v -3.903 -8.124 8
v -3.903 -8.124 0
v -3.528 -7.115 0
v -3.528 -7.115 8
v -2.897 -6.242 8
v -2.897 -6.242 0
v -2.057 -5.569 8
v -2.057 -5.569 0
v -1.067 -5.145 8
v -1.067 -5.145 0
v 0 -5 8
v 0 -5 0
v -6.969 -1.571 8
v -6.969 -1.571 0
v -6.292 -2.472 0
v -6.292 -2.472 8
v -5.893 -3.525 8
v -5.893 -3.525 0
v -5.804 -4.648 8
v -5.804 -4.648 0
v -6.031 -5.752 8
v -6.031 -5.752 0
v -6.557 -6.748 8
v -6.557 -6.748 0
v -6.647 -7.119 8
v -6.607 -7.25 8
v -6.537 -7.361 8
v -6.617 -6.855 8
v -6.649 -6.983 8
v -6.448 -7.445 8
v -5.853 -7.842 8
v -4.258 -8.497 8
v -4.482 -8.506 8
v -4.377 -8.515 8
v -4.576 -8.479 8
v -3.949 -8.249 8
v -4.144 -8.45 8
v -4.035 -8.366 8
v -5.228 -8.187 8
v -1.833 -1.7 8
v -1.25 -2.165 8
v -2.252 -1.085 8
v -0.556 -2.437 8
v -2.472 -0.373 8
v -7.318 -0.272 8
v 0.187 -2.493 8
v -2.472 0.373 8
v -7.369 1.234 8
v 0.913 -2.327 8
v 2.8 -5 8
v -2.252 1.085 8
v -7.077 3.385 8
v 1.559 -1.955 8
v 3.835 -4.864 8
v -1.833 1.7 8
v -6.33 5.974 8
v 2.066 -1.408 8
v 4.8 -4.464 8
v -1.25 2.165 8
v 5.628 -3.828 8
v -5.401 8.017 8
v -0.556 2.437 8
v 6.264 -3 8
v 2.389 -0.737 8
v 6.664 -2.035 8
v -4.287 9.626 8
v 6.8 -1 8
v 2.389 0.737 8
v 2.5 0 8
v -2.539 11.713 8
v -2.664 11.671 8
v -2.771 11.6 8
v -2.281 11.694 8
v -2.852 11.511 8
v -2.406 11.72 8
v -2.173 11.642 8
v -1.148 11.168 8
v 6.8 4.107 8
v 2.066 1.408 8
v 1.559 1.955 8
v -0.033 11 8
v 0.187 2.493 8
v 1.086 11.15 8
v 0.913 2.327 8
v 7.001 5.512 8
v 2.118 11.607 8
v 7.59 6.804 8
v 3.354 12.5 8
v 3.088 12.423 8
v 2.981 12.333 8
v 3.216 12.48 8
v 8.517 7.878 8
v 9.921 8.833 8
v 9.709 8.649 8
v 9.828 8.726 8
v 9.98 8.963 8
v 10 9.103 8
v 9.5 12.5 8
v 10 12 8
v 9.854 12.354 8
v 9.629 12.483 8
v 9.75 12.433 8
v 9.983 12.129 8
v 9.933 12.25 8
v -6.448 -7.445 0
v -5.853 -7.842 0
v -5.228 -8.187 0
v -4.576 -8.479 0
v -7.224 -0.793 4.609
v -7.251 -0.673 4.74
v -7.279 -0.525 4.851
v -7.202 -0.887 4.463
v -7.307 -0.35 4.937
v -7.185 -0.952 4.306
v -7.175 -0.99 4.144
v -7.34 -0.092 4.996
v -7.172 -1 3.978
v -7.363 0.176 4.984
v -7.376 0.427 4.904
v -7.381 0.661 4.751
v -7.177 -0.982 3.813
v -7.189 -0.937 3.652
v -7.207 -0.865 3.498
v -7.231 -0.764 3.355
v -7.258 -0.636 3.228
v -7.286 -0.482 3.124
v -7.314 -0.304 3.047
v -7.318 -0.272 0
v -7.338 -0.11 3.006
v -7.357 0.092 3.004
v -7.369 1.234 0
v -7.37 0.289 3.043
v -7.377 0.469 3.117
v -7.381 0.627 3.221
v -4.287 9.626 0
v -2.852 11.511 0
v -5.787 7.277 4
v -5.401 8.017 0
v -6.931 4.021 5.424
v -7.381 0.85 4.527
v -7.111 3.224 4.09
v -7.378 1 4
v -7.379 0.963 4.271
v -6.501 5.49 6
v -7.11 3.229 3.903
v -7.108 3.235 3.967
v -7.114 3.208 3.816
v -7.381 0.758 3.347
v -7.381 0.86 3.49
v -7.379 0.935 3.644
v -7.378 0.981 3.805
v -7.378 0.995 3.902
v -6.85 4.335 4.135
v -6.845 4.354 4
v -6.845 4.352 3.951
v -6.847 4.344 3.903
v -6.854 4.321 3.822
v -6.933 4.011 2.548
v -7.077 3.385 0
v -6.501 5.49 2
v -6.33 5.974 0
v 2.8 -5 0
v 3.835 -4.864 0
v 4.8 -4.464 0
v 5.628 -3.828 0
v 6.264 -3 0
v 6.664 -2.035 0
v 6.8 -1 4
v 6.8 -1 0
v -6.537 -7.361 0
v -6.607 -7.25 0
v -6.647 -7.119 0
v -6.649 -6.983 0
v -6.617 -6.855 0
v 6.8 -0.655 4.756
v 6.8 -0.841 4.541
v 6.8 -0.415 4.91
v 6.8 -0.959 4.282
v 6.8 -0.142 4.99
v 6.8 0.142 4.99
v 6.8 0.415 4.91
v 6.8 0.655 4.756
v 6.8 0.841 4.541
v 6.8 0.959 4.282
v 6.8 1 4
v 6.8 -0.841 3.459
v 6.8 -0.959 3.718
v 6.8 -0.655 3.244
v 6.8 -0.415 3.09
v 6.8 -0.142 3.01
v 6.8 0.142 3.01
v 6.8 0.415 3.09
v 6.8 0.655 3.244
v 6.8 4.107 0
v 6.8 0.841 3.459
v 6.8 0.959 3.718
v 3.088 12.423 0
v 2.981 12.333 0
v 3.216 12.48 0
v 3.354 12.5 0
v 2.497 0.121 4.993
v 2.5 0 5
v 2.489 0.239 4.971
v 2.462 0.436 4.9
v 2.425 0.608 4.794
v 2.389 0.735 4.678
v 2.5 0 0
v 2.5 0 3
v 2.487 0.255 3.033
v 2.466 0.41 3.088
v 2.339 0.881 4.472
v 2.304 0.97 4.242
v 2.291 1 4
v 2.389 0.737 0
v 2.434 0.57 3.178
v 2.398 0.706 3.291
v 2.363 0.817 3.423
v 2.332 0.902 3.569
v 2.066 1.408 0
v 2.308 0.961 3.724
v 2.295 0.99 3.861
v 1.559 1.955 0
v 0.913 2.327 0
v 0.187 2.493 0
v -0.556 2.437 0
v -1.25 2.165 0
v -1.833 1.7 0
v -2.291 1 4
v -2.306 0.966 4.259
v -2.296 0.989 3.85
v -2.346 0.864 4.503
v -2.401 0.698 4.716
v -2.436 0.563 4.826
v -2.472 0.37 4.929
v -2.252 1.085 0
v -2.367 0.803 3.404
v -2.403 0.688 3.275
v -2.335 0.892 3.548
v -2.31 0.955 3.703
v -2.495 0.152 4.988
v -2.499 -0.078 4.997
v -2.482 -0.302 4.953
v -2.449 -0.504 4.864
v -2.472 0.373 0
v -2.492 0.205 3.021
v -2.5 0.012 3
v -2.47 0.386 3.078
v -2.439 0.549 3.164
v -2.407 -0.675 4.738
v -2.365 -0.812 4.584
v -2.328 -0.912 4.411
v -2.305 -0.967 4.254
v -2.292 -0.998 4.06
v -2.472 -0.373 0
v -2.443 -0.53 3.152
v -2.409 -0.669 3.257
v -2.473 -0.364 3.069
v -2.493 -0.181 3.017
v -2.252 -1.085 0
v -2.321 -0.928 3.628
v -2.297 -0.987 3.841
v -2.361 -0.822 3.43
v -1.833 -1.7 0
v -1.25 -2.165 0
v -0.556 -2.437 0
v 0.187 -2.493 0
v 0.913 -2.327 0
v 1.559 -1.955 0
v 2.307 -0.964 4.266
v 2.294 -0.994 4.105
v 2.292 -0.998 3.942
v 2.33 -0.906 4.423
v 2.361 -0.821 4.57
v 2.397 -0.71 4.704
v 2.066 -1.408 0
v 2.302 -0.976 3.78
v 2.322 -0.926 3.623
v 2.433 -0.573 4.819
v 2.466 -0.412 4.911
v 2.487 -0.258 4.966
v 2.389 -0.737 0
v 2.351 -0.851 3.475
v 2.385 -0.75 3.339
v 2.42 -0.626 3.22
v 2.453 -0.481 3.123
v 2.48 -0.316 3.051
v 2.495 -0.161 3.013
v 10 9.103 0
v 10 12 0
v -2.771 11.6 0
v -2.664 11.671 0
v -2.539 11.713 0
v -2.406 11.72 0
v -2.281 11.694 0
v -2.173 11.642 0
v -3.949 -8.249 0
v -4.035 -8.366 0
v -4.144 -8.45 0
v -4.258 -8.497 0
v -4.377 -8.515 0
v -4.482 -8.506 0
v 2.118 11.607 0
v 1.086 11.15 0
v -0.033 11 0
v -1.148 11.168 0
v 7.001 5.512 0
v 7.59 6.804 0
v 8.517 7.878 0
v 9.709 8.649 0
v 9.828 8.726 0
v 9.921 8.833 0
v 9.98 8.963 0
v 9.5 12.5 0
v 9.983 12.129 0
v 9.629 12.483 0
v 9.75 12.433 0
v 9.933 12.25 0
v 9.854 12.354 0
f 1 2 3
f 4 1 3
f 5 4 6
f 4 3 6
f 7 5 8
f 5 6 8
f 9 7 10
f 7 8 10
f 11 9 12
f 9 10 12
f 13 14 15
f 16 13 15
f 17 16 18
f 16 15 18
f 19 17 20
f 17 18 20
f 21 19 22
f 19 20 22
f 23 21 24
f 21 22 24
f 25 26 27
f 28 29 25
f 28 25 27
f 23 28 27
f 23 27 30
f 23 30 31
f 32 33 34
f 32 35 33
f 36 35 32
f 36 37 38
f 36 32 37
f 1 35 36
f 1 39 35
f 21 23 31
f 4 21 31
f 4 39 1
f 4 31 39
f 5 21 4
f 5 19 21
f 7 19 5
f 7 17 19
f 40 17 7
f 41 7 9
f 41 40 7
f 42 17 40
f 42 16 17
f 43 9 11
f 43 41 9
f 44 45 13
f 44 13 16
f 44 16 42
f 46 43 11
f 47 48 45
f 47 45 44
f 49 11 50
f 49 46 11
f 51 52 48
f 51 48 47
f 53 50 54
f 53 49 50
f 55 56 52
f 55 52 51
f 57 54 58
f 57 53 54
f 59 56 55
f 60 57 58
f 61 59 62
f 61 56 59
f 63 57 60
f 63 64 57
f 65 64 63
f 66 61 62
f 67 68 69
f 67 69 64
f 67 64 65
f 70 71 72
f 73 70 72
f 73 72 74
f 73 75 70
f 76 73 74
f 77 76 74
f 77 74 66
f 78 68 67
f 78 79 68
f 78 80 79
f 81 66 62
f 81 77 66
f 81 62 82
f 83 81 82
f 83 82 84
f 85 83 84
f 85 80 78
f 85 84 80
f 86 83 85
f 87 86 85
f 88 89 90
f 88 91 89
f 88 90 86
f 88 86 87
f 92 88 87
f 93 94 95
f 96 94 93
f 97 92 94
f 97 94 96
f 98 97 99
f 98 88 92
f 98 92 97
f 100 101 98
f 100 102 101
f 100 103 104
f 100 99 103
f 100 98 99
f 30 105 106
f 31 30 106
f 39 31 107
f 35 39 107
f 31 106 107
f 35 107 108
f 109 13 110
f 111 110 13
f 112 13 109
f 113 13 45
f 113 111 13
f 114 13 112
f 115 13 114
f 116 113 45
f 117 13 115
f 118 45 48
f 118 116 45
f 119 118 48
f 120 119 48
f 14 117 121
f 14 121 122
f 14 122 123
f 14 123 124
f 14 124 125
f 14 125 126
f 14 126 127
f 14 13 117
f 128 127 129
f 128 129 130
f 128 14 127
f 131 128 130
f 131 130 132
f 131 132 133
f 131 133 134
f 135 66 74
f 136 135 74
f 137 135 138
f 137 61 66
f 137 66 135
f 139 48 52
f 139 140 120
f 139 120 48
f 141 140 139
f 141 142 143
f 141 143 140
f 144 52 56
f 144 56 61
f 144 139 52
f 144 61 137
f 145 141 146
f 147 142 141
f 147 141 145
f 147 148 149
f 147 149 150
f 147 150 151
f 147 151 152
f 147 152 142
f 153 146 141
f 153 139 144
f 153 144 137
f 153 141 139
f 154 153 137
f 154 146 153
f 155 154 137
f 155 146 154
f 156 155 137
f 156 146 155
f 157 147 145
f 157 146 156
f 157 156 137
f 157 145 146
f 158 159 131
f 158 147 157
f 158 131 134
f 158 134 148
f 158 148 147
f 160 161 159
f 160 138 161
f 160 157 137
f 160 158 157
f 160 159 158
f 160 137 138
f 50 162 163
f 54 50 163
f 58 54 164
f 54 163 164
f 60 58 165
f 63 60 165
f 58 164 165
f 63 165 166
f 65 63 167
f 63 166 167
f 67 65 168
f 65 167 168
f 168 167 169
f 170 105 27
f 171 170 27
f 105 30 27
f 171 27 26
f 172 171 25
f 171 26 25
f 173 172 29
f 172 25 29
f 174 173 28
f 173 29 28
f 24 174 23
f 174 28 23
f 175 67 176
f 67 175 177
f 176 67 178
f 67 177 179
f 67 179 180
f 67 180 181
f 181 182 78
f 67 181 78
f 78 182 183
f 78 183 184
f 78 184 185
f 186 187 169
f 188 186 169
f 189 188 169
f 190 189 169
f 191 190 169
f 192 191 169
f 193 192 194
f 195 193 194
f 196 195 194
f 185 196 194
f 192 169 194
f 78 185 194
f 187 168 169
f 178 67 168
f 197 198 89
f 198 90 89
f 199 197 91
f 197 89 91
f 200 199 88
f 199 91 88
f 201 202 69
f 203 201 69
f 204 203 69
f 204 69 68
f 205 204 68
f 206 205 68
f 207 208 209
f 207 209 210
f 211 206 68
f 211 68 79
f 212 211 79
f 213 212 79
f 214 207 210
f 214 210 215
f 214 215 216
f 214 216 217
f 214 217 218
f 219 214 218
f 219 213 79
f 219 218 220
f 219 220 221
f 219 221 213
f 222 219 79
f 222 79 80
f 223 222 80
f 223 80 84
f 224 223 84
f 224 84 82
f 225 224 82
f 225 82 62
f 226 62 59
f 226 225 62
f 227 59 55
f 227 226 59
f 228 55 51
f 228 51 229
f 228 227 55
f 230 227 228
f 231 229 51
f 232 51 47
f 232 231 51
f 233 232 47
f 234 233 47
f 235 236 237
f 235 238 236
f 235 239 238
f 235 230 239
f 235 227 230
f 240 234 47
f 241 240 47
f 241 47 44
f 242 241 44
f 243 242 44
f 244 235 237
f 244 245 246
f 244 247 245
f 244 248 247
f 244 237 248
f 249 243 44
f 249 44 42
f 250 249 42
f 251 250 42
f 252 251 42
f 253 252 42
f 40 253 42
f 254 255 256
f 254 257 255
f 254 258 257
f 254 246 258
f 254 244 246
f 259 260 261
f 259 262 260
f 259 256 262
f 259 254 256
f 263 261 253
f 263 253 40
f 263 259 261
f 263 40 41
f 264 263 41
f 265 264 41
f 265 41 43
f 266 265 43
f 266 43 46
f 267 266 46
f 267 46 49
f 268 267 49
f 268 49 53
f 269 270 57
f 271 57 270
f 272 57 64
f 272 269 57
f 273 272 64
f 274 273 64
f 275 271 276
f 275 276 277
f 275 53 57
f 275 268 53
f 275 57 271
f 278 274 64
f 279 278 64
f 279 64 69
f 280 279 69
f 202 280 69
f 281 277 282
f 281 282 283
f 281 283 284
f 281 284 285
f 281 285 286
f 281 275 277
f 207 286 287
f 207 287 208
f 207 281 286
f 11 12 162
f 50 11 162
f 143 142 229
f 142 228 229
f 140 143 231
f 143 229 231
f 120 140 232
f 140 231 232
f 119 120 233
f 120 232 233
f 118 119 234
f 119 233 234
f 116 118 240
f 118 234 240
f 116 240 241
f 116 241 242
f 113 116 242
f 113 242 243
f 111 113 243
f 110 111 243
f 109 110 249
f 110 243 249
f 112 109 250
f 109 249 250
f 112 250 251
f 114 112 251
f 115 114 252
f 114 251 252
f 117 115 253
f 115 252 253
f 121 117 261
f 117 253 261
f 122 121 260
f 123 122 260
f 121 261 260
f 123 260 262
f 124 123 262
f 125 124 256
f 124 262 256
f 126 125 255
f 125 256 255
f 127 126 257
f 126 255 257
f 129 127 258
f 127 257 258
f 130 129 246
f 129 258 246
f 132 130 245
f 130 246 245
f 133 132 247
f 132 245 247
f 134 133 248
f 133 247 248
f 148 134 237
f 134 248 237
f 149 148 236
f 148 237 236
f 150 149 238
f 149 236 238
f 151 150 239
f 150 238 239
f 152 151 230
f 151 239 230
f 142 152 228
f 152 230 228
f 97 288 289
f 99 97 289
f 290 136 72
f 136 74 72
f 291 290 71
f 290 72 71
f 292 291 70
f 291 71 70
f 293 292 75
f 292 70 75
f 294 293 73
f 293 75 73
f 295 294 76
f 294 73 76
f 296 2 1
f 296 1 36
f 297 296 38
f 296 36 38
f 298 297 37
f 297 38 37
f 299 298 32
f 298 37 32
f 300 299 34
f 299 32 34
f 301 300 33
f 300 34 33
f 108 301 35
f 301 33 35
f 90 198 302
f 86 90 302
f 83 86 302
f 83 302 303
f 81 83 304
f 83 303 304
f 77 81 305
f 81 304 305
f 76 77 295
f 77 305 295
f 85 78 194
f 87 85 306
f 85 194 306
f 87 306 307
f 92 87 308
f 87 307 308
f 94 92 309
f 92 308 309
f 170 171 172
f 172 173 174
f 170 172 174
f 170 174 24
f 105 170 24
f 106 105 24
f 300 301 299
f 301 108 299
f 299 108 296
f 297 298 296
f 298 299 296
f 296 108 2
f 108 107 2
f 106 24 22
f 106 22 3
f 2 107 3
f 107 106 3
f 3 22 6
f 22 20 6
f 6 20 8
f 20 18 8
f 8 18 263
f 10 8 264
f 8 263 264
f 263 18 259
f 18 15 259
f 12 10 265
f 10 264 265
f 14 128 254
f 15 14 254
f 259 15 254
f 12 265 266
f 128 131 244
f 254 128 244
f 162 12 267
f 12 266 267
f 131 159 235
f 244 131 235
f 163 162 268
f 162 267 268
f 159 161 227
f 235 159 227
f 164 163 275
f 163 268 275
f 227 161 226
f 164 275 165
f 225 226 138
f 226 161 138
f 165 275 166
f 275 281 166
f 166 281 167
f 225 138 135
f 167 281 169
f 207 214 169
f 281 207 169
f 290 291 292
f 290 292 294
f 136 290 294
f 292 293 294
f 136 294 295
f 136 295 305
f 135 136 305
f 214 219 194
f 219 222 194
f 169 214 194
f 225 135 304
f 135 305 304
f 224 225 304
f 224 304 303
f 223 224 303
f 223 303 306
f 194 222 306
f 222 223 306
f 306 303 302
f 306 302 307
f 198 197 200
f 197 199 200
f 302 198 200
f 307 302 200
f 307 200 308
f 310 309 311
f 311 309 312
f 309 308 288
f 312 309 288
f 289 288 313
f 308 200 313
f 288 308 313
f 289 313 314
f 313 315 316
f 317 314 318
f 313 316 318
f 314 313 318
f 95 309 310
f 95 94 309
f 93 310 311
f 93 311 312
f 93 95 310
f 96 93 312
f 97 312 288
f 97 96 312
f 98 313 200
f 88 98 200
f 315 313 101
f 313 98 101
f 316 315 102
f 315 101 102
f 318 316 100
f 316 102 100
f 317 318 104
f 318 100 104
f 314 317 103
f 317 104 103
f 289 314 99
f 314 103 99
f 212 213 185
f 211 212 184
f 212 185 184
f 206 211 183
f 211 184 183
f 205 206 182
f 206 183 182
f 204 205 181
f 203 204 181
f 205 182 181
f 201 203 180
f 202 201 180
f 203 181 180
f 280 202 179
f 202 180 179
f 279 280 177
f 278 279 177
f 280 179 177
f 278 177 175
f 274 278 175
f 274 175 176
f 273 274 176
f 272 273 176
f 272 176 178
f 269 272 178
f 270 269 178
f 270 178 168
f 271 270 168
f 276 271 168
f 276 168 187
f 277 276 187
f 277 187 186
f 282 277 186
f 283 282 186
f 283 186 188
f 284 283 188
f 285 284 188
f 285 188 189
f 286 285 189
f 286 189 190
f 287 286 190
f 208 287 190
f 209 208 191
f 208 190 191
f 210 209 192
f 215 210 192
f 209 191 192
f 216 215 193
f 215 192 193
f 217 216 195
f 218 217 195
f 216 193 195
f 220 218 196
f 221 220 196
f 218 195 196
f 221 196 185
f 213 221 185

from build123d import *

# Parameters (mm, degrees)
F0_R     = 2.5
F1_DEPTH = 8
F2_R     = 0.5
F3_R     = 1
F4_DEPTH = 12.5


with BuildPart() as f1:
    # F0 (on Top) → F1 (new body)
    with BuildSketch(Plane.XY):
        with BuildLine():
            ThreePointArc((-3.9878581514, -8.6885720566), (-2.7160898573, -6.0635300296), (0, -5))
            Line((0, -5), (2.8, -5))
            ThreePointArc((2.8, -5), (5.6284271247, -3.8284271247), (6.8, -1))
            Line((6.8, -1), (6.8, 4.1070405464))
            ThreePointArc((6.8, 4.1070405464), (7.6768943744, 6.9354676711), (10, 8.7718020623))
            Line((10, 8.7718020623), (10, 12.5))
            Line((10, 12.5), (3.1224989992, 12.5))
            ThreePointArc((3.1224989992, 12.5), (0.4005785985, 11.0201084454), (-2.5616621646, 11.9278855889))
            add(Edge.make_bspline(
                [(-6.9689841618, -1.5710293014), (-8.0102303747, 0.7595881395), (-5.9806638587, 8.3334675363), (-4.0694582276, 9.7266677767), (-2.5616621646, 11.9278855889)],
                knots=[0, 0, 0, 0, 0.5567053674, 1, 1, 1, 1], degree=3))
            ThreePointArc((-6.9689841618, -1.5710293014), (-5.7970541621, -4.324632576), (-6.8636587821, -7.1207201108))
            ThreePointArc((-6.8636587821, -7.1207201108), (-5.5019929053, -8.0444775564), (-3.9878581514, -8.6885720566))
        make_face()
        Circle(F0_R, mode=Mode.SUBTRACT)
    extrude(amount=F1_DEPTH)

    # F2
    f2_edges = [f1.edges().sort_by_distance(p)[0] for p in [
        (10, 12.5, 4),
        (3.122499, 12.5, 4),
        (-2.561662, 11.927886, 4),
        (10, 8.771802, 4),
        (-3.987858, -8.688572, 4),
        (-6.863659, -7.12072, 4),
    ]]
    fillet(f2_edges, radius=F2_R)

    # F3 (on Right) → F4 (cut, symmetric)
    with BuildSketch(Plane.YZ):
        with Locations((0, 4)):
            Circle(F3_R)
    extrude(amount=F4_DEPTH, both=True, mode=Mode.SUBTRACT)


solid = f1.part
